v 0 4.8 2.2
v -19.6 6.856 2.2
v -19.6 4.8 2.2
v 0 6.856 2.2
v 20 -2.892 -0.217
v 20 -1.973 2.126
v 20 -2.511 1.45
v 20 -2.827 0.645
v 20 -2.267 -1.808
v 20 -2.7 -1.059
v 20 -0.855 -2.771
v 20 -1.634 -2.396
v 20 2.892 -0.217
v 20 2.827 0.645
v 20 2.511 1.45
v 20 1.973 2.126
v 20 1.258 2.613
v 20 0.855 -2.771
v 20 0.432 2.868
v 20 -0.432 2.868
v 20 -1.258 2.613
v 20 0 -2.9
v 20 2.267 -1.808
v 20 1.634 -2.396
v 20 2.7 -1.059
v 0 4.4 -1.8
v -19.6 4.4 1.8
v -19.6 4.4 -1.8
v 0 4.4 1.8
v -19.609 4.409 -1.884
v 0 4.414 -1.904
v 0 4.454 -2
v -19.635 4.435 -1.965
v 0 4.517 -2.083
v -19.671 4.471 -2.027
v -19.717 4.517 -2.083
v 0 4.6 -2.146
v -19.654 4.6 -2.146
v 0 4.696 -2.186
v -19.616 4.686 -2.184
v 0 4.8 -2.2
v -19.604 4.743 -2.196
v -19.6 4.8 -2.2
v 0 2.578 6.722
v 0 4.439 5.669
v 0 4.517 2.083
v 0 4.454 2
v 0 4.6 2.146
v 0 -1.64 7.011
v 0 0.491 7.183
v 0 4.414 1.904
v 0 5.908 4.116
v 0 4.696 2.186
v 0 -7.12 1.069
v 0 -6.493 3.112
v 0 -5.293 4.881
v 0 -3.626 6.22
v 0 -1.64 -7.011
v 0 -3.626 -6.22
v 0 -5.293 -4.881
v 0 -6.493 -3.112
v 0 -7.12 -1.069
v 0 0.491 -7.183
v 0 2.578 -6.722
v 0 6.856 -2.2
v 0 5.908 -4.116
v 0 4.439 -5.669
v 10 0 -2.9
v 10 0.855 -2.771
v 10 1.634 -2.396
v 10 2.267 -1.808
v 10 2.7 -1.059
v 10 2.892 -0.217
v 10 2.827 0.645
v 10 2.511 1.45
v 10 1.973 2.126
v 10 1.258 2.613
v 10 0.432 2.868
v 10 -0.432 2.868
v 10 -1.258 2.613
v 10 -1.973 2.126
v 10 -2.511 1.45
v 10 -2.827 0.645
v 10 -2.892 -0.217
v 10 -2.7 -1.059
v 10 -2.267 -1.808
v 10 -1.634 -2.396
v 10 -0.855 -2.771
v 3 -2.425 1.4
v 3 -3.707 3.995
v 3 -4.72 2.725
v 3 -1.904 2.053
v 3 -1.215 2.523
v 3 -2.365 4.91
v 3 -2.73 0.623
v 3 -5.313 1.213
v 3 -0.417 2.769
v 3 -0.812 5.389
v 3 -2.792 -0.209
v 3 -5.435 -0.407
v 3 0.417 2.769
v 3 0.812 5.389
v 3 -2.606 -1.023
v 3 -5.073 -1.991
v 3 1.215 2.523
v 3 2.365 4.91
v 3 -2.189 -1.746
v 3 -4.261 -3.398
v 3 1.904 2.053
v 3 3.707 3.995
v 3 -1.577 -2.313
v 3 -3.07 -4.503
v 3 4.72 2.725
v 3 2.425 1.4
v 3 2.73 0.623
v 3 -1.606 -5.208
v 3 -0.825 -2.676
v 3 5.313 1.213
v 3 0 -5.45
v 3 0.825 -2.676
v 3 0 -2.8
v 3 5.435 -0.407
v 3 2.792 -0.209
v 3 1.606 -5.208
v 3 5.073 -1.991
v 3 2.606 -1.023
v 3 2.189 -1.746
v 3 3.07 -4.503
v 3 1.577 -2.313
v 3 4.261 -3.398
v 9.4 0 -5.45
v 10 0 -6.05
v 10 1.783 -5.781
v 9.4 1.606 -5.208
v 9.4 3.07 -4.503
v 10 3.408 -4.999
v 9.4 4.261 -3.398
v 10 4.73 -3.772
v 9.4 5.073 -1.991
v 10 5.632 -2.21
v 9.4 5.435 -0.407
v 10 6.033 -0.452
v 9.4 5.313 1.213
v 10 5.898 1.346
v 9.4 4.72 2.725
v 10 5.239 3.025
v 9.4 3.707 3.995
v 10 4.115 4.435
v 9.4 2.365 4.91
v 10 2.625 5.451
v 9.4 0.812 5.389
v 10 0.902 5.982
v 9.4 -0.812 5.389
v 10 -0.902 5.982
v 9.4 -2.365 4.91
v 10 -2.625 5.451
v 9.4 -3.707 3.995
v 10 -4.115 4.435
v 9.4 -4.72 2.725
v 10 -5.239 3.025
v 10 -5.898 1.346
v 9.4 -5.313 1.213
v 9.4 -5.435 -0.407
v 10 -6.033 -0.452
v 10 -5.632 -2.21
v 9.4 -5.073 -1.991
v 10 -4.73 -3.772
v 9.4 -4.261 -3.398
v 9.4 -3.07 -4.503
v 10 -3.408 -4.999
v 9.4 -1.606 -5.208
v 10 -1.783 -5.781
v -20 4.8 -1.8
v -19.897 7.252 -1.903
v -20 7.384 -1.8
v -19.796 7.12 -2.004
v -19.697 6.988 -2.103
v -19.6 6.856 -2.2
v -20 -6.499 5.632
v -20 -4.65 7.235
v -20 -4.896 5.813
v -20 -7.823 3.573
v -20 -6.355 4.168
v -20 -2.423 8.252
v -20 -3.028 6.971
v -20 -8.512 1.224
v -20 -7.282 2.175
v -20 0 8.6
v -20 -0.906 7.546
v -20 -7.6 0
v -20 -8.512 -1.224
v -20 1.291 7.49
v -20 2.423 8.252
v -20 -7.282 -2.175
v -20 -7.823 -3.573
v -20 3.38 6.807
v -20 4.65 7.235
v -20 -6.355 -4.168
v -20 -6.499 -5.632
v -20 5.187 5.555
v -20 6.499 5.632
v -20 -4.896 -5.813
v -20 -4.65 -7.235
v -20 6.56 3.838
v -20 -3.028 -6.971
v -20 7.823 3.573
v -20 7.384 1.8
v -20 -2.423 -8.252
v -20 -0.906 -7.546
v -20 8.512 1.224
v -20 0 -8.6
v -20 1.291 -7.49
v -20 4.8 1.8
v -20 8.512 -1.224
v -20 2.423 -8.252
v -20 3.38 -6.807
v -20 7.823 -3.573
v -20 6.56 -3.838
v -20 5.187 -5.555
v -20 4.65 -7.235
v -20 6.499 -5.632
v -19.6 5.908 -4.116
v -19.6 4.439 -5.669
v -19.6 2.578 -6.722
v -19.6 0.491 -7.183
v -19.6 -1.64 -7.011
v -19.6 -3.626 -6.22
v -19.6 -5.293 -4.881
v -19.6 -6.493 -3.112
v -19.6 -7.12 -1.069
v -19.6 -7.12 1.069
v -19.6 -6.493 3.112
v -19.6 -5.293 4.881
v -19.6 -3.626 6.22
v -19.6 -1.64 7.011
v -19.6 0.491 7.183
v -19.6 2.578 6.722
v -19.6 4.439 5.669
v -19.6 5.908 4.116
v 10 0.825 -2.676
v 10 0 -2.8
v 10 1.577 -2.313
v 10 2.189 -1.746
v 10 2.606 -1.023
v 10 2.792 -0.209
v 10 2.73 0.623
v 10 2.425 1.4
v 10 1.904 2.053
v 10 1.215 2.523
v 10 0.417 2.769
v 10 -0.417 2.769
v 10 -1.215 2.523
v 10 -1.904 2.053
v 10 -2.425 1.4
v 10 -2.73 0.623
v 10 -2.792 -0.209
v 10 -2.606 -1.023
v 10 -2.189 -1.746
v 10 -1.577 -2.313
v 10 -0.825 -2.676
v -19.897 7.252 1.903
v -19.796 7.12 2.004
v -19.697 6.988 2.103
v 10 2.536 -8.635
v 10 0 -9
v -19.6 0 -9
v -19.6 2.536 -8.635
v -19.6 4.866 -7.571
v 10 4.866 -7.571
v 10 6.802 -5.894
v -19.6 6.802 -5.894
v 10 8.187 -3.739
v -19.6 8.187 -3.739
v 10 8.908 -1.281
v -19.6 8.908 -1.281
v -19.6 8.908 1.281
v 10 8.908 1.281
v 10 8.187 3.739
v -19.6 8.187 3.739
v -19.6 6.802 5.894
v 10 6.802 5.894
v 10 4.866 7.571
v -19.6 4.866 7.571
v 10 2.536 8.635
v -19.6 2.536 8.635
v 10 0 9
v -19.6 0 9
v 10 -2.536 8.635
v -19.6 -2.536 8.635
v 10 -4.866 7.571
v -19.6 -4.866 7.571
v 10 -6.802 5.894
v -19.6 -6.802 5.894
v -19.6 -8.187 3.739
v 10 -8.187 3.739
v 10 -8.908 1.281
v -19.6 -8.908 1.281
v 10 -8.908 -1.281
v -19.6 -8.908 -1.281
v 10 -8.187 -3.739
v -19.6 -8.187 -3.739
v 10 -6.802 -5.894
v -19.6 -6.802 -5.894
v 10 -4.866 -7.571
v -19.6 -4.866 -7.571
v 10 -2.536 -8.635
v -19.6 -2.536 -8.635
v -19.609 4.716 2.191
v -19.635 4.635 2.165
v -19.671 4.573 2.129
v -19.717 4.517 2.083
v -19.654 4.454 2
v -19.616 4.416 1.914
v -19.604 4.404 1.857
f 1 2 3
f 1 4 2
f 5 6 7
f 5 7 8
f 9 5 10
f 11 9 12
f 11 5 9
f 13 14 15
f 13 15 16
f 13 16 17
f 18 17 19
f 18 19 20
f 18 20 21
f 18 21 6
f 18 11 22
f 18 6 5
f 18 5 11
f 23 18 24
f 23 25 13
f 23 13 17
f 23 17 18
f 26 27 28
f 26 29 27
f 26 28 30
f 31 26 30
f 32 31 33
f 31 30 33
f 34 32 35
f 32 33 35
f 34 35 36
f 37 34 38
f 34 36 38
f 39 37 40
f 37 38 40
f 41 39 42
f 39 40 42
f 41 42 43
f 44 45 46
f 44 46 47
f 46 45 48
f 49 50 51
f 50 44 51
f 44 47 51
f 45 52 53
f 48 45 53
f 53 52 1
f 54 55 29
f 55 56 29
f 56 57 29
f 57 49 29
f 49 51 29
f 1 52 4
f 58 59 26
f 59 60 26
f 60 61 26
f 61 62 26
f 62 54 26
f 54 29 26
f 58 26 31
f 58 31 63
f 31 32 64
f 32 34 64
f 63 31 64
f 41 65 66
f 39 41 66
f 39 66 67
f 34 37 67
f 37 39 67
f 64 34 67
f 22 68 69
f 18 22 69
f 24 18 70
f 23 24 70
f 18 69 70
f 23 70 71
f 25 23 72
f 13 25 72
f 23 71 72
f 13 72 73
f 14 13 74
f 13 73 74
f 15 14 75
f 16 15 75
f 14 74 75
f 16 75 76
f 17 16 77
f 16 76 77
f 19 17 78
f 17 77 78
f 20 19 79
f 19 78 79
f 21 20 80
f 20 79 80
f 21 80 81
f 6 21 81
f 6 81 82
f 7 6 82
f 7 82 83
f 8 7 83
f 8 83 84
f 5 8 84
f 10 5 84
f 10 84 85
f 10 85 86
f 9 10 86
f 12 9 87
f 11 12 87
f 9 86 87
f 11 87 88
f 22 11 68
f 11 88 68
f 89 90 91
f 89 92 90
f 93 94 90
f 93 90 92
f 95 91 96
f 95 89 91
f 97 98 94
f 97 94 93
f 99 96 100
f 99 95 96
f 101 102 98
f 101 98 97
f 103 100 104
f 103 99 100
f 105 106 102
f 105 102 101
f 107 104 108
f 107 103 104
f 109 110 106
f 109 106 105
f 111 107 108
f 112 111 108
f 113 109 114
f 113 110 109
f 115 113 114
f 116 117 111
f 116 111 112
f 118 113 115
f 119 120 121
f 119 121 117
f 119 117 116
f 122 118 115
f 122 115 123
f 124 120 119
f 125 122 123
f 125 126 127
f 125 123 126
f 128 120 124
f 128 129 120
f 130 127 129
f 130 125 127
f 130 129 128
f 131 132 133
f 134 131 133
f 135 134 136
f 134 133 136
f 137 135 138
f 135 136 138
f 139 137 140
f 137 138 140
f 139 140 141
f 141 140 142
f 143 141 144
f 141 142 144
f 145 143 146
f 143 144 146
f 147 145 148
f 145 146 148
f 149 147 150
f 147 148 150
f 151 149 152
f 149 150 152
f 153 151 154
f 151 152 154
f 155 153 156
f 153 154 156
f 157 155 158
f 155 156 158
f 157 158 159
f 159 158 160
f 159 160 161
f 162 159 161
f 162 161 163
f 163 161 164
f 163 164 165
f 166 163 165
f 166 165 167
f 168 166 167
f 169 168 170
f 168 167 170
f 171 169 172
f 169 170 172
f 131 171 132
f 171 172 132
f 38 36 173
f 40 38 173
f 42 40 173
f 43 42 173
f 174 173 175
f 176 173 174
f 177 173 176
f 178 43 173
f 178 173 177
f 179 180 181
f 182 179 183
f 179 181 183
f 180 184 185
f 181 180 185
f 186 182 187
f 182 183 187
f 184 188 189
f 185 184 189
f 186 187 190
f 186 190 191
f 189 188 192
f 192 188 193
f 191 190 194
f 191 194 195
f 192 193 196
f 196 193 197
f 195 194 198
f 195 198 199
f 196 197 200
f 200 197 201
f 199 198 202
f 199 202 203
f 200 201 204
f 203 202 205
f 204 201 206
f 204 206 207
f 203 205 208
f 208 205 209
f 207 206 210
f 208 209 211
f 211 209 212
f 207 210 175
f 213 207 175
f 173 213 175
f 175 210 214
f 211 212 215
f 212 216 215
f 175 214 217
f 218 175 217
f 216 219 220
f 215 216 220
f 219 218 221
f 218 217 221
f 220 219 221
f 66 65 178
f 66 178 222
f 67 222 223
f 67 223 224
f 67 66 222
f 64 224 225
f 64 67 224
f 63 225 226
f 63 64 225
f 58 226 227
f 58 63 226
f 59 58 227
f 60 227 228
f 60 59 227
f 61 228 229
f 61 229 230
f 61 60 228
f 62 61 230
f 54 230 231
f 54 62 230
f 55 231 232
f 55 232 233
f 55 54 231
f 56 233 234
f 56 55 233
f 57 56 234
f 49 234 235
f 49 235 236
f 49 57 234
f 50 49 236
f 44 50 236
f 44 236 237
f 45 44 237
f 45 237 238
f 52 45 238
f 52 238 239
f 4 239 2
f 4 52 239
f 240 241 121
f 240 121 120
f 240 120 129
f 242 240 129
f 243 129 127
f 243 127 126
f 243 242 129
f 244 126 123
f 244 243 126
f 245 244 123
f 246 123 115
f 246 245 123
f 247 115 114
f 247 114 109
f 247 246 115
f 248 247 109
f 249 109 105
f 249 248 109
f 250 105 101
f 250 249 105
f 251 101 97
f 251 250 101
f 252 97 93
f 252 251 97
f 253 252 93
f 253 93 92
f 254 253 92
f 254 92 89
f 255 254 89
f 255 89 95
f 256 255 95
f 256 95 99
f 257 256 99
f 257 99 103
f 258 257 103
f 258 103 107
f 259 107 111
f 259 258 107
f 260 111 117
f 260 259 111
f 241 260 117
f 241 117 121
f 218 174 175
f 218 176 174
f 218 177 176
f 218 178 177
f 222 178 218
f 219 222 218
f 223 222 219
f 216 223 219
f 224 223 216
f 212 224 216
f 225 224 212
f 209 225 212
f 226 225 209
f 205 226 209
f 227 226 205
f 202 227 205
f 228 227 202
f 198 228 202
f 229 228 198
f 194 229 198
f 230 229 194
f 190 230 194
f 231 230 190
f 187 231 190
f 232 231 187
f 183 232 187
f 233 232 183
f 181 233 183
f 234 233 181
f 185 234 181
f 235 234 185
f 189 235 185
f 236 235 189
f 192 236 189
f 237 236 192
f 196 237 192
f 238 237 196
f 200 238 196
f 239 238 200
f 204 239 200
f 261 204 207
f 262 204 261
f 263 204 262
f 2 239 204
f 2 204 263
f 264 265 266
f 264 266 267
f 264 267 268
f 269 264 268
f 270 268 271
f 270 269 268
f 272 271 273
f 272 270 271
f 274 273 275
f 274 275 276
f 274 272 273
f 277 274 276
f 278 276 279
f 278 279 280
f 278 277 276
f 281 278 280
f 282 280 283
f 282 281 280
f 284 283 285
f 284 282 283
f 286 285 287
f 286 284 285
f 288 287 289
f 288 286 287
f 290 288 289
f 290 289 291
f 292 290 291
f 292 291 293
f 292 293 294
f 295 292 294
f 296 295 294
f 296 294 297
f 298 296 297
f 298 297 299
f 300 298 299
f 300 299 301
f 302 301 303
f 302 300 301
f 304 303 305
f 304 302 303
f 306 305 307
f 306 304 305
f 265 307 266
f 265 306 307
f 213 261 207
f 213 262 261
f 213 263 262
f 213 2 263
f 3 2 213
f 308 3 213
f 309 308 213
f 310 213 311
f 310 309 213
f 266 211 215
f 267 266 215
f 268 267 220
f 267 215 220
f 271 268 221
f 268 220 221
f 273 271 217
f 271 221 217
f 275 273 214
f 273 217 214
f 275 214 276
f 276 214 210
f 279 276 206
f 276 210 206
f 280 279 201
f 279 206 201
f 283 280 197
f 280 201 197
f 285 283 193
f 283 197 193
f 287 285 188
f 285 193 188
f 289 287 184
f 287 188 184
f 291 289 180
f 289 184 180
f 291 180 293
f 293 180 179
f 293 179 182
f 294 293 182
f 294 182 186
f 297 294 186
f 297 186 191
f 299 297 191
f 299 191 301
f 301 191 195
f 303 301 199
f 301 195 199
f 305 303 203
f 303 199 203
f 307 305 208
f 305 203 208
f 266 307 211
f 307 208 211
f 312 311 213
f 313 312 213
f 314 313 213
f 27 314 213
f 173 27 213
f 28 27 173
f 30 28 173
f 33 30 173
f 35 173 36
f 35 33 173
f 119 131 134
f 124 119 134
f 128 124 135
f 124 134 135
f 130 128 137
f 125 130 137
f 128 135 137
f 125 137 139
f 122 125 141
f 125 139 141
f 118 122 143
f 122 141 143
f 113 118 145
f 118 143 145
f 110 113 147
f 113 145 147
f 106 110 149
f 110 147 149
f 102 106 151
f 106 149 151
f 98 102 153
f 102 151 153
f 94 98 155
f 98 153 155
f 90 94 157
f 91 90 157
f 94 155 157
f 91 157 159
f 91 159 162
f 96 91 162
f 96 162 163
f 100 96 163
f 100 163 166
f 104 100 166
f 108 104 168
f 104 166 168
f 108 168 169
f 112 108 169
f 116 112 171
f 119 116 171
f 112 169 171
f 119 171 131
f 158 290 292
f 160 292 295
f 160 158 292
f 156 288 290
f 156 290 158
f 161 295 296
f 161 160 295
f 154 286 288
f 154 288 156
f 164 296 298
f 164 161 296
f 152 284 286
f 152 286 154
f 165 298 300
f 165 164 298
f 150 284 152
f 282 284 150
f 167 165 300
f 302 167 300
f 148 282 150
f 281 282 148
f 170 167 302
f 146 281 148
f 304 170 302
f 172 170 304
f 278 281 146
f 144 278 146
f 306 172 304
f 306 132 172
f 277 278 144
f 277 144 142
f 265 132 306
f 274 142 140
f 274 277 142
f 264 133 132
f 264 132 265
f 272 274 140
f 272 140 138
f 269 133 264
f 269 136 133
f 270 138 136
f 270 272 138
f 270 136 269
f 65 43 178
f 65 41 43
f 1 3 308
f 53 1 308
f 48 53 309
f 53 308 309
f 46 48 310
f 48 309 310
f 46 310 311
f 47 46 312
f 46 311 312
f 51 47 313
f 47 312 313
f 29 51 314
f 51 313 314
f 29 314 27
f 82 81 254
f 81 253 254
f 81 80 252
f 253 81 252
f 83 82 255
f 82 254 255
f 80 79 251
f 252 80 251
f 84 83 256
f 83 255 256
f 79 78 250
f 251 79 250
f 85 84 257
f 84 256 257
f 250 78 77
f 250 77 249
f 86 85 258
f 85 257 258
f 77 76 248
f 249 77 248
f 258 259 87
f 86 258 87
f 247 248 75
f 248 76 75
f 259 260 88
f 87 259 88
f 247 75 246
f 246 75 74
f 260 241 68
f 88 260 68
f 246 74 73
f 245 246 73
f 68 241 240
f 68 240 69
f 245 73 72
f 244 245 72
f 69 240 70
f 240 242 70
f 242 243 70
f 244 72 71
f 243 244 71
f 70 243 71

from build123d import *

# Parameters (mm, degrees)
SKETCH_1_R          = 9
EXTRUDE_1_DEPTH     = 20
EXTRUDE_START       = 10
SKETCH_2_R          = 9
EXTRUDE_2_DEPTH     = 10
SKETCH_4_R          = 5.45
SKETCH_4_R_2        = 2.8
CUT_EXTRUDE_1_DEPTH = 7
SKETCH_5_R          = 2.9
EXTRUDE_3_DEPTH     = 10
CHAMFER_1_SIZE      = 0.6
CHAMFER_2_SIZE      = 0.4
FILLET_3_R          = 0.4


with BuildPart() as part:
    # 草图1 → 凸台-拉伸1 (new body)
    with BuildSketch(Plane(origin=(0, 0, 0), x_dir=(0, 0, -1), z_dir=(1, 0, 0))):
        Circle(SKETCH_1_R)
        with BuildLine():
            Line((-2.2, 4.4), (2.2, 4.4))
            Line((2.2, 4.4), (2.2, 6.8556546))
            ThreePointArc((2.2, 6.8556546), (0, -7.2), (-2.2, 6.8556546))
            Line((-2.2, 6.8556546), (-2.2, 4.4))
        make_face(mode=Mode.SUBTRACT)
    extrude(amount=-EXTRUDE_1_DEPTH)

    # 草图2 → 凸台-拉伸2 (add)
    with BuildSketch(Plane(origin=(0, 0, 0), x_dir=(0, 0, -1), z_dir=(1, 0, 0)).offset(EXTRUDE_START)):
        Circle(SKETCH_2_R)
    extrude(amount=-EXTRUDE_2_DEPTH)

    # 草图4 → 切除-拉伸1 (cut)
    with BuildSketch(Plane(origin=(10, 0, 0), x_dir=(0, 0, -1), z_dir=(1, 0, 0))):
        Circle(SKETCH_4_R)
        Circle(SKETCH_4_R_2, mode=Mode.SUBTRACT)
    extrude(amount=-CUT_EXTRUDE_1_DEPTH, mode=Mode.SUBTRACT)

    # 草图5 → 凸台-拉伸3 (add)
    with BuildSketch(Plane(origin=(10, 0, 0), x_dir=(0, 0, -1), z_dir=(1, 0, 0))):
        Circle(SKETCH_5_R)
    extrude(amount=EXTRUDE_3_DEPTH)

    # Chamfer 1
    chamfer_1_edges = [part.edges().sort_by_distance(p)[0] for p in [
        (10, 0, 5.45),
    ]]
    chamfer(chamfer_1_edges, length=CHAMFER_1_SIZE)

    # Chamfer 2
    chamfer_2_edges = [part.edges().sort_by_distance(p)[0] for p in [
        (-20, 0, 9),
        (-20, 5.6278273, 2.2),
        (-20, 4.4, 0),
        (-20, 5.6278273, -2.2),
        (-20, -7.2, 0),
    ]]
    chamfer(chamfer_2_edges, length=CHAMFER_2_SIZE)

    # 圆角3
    fillet_3_edges = [part.edges().sort_by_distance(p)[0] for p in [
        (-9.8, 4.4, 2.2),
        (-9.8, 4.4, -2.2),
    ]]
    fillet(fillet_3_edges, radius=FILLET_3_R)


solid = part.part
